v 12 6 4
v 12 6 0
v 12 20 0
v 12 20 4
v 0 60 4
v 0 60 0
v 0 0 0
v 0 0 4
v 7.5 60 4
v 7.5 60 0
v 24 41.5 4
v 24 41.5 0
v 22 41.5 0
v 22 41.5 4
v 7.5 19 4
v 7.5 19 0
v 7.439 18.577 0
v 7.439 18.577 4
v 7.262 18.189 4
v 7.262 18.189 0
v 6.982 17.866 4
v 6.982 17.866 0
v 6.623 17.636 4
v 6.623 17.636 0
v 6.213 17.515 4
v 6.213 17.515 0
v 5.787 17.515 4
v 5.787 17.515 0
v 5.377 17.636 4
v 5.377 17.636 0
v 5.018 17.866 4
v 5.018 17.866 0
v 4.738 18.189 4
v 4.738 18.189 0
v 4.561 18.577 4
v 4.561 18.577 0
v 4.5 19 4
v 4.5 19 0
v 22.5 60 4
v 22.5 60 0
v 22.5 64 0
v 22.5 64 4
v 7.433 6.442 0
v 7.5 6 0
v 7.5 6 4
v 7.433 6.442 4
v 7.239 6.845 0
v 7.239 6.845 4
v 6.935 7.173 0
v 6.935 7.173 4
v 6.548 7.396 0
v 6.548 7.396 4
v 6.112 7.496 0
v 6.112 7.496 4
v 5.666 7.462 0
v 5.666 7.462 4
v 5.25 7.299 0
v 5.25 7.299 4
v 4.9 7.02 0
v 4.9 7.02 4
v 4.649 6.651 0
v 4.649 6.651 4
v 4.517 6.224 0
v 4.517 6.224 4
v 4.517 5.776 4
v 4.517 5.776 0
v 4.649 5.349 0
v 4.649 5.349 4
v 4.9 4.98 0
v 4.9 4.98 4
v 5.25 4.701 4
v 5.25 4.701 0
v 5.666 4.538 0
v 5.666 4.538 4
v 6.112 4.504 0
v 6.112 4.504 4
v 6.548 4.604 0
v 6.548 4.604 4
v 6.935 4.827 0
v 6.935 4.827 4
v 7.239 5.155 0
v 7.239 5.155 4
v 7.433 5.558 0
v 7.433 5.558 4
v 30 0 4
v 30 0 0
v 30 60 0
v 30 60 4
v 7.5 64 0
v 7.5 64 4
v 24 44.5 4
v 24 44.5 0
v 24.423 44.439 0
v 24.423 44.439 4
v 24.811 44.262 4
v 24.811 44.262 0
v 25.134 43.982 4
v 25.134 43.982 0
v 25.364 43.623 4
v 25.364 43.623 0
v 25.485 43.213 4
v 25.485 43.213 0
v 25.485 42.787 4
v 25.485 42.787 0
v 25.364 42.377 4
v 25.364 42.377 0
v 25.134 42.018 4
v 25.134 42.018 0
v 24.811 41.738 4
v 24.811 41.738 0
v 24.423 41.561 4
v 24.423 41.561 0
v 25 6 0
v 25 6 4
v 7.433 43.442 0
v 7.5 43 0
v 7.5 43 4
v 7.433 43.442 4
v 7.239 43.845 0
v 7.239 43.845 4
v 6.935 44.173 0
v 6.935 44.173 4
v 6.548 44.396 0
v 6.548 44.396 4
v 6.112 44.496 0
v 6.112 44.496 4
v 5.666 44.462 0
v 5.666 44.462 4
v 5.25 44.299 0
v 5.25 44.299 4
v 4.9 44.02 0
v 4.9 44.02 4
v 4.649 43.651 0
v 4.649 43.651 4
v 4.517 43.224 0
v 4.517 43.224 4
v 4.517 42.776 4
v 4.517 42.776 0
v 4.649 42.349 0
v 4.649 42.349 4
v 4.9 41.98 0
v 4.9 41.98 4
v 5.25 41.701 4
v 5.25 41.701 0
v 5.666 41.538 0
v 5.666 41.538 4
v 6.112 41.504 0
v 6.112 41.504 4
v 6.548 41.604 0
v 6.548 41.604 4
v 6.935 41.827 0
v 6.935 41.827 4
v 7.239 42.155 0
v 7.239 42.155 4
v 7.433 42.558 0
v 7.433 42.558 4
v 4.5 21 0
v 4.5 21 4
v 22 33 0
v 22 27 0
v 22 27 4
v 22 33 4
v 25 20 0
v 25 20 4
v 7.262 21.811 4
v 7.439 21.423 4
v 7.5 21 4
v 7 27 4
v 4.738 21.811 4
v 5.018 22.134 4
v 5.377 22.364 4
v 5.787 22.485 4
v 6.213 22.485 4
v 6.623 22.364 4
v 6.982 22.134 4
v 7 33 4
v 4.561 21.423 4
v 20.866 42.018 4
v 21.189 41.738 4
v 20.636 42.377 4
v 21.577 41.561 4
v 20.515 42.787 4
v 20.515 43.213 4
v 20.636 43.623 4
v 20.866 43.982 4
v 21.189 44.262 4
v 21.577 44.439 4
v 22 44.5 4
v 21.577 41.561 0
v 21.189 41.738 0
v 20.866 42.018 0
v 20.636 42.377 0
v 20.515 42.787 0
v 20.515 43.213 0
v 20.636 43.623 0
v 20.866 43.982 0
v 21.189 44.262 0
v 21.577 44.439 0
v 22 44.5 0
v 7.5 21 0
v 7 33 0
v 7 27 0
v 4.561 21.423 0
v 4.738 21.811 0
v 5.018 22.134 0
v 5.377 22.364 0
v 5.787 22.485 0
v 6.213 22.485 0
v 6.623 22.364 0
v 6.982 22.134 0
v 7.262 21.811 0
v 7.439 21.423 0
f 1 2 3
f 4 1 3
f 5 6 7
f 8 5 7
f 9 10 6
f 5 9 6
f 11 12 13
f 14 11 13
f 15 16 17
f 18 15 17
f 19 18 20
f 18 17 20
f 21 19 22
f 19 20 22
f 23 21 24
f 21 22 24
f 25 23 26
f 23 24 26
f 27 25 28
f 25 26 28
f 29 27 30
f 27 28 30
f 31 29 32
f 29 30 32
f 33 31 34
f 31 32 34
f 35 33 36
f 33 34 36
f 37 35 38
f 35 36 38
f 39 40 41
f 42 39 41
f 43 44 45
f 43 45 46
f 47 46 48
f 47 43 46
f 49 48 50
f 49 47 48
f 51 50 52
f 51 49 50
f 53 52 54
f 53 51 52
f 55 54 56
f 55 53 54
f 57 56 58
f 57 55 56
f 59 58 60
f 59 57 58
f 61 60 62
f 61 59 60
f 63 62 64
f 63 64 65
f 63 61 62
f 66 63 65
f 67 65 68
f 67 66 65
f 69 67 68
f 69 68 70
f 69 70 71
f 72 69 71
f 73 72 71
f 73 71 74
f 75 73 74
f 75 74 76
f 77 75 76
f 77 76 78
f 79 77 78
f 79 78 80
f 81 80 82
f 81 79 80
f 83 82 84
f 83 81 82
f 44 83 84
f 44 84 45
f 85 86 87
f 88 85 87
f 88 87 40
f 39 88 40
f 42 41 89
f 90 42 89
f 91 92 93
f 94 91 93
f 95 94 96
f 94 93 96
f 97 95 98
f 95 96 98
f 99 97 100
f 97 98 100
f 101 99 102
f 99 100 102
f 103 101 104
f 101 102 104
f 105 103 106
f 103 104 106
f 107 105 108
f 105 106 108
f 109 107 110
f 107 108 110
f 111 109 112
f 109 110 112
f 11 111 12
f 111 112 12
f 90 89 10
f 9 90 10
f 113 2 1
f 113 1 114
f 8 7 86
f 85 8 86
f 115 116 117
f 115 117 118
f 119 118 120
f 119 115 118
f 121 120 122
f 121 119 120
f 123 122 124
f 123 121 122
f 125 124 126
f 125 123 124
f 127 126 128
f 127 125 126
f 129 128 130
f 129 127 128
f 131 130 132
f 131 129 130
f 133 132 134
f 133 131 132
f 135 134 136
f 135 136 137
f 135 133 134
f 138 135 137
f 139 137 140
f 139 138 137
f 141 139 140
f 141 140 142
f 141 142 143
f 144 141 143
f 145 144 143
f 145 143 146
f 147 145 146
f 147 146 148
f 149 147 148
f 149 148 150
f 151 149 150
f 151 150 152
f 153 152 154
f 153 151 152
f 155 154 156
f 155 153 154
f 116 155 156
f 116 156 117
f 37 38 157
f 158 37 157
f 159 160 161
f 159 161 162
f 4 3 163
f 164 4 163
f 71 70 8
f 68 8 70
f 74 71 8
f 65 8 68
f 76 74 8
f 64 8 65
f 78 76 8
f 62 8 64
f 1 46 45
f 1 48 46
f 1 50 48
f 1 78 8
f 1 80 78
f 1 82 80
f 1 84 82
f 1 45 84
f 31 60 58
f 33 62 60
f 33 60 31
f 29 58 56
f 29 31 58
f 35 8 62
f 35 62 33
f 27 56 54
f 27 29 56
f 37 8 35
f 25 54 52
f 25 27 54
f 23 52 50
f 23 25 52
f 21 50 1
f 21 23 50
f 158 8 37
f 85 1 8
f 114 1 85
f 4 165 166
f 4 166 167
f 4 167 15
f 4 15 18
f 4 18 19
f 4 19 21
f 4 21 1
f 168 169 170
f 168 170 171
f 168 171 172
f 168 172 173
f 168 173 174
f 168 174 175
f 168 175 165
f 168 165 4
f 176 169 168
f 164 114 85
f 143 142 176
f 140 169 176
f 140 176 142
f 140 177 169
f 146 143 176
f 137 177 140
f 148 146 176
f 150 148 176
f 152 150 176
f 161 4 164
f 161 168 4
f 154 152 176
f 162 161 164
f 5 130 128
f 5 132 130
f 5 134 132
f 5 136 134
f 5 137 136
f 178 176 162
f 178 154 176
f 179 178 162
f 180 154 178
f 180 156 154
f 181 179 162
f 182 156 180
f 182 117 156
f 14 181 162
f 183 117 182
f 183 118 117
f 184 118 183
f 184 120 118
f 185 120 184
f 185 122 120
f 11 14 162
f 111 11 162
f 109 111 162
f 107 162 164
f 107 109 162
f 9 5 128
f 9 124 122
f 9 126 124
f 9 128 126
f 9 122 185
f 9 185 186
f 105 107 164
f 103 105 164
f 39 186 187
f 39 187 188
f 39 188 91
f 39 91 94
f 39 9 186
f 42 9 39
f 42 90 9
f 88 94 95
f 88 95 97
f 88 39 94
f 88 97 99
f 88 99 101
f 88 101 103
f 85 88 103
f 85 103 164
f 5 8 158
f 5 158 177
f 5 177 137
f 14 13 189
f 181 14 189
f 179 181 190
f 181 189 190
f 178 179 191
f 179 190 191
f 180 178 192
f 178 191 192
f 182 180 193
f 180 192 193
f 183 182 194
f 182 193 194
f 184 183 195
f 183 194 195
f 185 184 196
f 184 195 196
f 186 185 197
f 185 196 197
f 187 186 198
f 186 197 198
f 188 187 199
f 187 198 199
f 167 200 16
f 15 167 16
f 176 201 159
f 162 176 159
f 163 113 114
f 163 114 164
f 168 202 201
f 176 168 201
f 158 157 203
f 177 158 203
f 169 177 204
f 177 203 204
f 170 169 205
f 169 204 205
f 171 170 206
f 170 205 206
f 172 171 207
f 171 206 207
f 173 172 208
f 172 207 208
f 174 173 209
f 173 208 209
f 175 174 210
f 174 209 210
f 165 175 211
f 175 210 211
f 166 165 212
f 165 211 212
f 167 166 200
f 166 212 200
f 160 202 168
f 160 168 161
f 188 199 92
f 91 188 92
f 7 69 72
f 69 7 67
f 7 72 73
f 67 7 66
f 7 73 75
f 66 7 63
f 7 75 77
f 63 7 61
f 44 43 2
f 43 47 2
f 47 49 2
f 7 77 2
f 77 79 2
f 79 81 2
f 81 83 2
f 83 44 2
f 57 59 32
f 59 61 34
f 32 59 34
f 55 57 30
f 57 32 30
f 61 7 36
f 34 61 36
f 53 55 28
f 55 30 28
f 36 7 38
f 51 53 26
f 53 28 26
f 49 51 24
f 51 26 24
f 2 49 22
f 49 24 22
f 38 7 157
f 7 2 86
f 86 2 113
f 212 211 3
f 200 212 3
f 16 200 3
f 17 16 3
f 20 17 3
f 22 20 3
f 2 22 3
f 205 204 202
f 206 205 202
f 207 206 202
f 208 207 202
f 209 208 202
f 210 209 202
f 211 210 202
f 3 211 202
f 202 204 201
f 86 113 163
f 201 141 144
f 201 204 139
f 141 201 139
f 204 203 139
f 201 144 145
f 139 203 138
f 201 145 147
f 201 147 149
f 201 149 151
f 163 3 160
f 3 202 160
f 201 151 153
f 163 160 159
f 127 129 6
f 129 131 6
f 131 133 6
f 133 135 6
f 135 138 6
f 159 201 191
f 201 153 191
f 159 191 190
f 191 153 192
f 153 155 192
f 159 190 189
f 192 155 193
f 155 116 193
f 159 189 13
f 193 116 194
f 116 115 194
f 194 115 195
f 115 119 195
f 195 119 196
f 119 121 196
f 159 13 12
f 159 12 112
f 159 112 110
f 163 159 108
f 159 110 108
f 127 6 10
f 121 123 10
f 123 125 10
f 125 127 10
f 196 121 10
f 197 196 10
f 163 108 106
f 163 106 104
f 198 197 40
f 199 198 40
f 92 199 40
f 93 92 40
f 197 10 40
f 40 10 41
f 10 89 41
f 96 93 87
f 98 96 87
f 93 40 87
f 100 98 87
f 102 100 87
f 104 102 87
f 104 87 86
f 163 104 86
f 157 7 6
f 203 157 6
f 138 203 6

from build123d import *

# Parameters (mm, degrees)
SKETCH1_R           = 1.5
SKETCH1_W           = 13
SKETCH1_H           = 14
SKETCH1_W_2         = 15
SKETCH1_H_2         = 6
BOSS_EXTRUDE1_DEPTH = 4


with BuildPart() as part:
    # Sketch1 → Boss-Extrude1 (new body)
    with BuildSketch(Plane.XY):
        Polygon((0, 0), (30, 0), (30, 60), (22.5, 60), (22.5, 64), (7.5, 64), (7.5, 60), (0, 60), align=None)
        with Locations((6, 6)):
            Circle(SKETCH1_R, mode=Mode.SUBTRACT)
        with Locations((6, 43)):
            Circle(SKETCH1_R, mode=Mode.SUBTRACT)
        with Locations((18.5, 13)):
            Rectangle(SKETCH1_W, SKETCH1_H, mode=Mode.SUBTRACT)
        with Locations((14.5, 30)):
            Rectangle(SKETCH1_W_2, SKETCH1_H_2, mode=Mode.SUBTRACT)
        with BuildLine():
            Line((7.5, 21), (7.5, 19))
            ThreePointArc((7.5, 19), (6, 17.5), (4.5, 19))
            Line((4.5, 19), (4.5, 21))
            ThreePointArc((4.5, 21), (6, 22.5), (7.5, 21))
        make_face(mode=Mode.SUBTRACT)
        with BuildLine():
            Line((22, 44.5), (24, 44.5))
            ThreePointArc((24, 44.5), (25.5, 43), (24, 41.5))
            Line((24, 41.5), (22, 41.5))
            ThreePointArc((22, 41.5), (20.5, 43), (22, 44.5))
        make_face(mode=Mode.SUBTRACT)
    extrude(amount=BOSS_EXTRUDE1_DEPTH)


solid = part.part
